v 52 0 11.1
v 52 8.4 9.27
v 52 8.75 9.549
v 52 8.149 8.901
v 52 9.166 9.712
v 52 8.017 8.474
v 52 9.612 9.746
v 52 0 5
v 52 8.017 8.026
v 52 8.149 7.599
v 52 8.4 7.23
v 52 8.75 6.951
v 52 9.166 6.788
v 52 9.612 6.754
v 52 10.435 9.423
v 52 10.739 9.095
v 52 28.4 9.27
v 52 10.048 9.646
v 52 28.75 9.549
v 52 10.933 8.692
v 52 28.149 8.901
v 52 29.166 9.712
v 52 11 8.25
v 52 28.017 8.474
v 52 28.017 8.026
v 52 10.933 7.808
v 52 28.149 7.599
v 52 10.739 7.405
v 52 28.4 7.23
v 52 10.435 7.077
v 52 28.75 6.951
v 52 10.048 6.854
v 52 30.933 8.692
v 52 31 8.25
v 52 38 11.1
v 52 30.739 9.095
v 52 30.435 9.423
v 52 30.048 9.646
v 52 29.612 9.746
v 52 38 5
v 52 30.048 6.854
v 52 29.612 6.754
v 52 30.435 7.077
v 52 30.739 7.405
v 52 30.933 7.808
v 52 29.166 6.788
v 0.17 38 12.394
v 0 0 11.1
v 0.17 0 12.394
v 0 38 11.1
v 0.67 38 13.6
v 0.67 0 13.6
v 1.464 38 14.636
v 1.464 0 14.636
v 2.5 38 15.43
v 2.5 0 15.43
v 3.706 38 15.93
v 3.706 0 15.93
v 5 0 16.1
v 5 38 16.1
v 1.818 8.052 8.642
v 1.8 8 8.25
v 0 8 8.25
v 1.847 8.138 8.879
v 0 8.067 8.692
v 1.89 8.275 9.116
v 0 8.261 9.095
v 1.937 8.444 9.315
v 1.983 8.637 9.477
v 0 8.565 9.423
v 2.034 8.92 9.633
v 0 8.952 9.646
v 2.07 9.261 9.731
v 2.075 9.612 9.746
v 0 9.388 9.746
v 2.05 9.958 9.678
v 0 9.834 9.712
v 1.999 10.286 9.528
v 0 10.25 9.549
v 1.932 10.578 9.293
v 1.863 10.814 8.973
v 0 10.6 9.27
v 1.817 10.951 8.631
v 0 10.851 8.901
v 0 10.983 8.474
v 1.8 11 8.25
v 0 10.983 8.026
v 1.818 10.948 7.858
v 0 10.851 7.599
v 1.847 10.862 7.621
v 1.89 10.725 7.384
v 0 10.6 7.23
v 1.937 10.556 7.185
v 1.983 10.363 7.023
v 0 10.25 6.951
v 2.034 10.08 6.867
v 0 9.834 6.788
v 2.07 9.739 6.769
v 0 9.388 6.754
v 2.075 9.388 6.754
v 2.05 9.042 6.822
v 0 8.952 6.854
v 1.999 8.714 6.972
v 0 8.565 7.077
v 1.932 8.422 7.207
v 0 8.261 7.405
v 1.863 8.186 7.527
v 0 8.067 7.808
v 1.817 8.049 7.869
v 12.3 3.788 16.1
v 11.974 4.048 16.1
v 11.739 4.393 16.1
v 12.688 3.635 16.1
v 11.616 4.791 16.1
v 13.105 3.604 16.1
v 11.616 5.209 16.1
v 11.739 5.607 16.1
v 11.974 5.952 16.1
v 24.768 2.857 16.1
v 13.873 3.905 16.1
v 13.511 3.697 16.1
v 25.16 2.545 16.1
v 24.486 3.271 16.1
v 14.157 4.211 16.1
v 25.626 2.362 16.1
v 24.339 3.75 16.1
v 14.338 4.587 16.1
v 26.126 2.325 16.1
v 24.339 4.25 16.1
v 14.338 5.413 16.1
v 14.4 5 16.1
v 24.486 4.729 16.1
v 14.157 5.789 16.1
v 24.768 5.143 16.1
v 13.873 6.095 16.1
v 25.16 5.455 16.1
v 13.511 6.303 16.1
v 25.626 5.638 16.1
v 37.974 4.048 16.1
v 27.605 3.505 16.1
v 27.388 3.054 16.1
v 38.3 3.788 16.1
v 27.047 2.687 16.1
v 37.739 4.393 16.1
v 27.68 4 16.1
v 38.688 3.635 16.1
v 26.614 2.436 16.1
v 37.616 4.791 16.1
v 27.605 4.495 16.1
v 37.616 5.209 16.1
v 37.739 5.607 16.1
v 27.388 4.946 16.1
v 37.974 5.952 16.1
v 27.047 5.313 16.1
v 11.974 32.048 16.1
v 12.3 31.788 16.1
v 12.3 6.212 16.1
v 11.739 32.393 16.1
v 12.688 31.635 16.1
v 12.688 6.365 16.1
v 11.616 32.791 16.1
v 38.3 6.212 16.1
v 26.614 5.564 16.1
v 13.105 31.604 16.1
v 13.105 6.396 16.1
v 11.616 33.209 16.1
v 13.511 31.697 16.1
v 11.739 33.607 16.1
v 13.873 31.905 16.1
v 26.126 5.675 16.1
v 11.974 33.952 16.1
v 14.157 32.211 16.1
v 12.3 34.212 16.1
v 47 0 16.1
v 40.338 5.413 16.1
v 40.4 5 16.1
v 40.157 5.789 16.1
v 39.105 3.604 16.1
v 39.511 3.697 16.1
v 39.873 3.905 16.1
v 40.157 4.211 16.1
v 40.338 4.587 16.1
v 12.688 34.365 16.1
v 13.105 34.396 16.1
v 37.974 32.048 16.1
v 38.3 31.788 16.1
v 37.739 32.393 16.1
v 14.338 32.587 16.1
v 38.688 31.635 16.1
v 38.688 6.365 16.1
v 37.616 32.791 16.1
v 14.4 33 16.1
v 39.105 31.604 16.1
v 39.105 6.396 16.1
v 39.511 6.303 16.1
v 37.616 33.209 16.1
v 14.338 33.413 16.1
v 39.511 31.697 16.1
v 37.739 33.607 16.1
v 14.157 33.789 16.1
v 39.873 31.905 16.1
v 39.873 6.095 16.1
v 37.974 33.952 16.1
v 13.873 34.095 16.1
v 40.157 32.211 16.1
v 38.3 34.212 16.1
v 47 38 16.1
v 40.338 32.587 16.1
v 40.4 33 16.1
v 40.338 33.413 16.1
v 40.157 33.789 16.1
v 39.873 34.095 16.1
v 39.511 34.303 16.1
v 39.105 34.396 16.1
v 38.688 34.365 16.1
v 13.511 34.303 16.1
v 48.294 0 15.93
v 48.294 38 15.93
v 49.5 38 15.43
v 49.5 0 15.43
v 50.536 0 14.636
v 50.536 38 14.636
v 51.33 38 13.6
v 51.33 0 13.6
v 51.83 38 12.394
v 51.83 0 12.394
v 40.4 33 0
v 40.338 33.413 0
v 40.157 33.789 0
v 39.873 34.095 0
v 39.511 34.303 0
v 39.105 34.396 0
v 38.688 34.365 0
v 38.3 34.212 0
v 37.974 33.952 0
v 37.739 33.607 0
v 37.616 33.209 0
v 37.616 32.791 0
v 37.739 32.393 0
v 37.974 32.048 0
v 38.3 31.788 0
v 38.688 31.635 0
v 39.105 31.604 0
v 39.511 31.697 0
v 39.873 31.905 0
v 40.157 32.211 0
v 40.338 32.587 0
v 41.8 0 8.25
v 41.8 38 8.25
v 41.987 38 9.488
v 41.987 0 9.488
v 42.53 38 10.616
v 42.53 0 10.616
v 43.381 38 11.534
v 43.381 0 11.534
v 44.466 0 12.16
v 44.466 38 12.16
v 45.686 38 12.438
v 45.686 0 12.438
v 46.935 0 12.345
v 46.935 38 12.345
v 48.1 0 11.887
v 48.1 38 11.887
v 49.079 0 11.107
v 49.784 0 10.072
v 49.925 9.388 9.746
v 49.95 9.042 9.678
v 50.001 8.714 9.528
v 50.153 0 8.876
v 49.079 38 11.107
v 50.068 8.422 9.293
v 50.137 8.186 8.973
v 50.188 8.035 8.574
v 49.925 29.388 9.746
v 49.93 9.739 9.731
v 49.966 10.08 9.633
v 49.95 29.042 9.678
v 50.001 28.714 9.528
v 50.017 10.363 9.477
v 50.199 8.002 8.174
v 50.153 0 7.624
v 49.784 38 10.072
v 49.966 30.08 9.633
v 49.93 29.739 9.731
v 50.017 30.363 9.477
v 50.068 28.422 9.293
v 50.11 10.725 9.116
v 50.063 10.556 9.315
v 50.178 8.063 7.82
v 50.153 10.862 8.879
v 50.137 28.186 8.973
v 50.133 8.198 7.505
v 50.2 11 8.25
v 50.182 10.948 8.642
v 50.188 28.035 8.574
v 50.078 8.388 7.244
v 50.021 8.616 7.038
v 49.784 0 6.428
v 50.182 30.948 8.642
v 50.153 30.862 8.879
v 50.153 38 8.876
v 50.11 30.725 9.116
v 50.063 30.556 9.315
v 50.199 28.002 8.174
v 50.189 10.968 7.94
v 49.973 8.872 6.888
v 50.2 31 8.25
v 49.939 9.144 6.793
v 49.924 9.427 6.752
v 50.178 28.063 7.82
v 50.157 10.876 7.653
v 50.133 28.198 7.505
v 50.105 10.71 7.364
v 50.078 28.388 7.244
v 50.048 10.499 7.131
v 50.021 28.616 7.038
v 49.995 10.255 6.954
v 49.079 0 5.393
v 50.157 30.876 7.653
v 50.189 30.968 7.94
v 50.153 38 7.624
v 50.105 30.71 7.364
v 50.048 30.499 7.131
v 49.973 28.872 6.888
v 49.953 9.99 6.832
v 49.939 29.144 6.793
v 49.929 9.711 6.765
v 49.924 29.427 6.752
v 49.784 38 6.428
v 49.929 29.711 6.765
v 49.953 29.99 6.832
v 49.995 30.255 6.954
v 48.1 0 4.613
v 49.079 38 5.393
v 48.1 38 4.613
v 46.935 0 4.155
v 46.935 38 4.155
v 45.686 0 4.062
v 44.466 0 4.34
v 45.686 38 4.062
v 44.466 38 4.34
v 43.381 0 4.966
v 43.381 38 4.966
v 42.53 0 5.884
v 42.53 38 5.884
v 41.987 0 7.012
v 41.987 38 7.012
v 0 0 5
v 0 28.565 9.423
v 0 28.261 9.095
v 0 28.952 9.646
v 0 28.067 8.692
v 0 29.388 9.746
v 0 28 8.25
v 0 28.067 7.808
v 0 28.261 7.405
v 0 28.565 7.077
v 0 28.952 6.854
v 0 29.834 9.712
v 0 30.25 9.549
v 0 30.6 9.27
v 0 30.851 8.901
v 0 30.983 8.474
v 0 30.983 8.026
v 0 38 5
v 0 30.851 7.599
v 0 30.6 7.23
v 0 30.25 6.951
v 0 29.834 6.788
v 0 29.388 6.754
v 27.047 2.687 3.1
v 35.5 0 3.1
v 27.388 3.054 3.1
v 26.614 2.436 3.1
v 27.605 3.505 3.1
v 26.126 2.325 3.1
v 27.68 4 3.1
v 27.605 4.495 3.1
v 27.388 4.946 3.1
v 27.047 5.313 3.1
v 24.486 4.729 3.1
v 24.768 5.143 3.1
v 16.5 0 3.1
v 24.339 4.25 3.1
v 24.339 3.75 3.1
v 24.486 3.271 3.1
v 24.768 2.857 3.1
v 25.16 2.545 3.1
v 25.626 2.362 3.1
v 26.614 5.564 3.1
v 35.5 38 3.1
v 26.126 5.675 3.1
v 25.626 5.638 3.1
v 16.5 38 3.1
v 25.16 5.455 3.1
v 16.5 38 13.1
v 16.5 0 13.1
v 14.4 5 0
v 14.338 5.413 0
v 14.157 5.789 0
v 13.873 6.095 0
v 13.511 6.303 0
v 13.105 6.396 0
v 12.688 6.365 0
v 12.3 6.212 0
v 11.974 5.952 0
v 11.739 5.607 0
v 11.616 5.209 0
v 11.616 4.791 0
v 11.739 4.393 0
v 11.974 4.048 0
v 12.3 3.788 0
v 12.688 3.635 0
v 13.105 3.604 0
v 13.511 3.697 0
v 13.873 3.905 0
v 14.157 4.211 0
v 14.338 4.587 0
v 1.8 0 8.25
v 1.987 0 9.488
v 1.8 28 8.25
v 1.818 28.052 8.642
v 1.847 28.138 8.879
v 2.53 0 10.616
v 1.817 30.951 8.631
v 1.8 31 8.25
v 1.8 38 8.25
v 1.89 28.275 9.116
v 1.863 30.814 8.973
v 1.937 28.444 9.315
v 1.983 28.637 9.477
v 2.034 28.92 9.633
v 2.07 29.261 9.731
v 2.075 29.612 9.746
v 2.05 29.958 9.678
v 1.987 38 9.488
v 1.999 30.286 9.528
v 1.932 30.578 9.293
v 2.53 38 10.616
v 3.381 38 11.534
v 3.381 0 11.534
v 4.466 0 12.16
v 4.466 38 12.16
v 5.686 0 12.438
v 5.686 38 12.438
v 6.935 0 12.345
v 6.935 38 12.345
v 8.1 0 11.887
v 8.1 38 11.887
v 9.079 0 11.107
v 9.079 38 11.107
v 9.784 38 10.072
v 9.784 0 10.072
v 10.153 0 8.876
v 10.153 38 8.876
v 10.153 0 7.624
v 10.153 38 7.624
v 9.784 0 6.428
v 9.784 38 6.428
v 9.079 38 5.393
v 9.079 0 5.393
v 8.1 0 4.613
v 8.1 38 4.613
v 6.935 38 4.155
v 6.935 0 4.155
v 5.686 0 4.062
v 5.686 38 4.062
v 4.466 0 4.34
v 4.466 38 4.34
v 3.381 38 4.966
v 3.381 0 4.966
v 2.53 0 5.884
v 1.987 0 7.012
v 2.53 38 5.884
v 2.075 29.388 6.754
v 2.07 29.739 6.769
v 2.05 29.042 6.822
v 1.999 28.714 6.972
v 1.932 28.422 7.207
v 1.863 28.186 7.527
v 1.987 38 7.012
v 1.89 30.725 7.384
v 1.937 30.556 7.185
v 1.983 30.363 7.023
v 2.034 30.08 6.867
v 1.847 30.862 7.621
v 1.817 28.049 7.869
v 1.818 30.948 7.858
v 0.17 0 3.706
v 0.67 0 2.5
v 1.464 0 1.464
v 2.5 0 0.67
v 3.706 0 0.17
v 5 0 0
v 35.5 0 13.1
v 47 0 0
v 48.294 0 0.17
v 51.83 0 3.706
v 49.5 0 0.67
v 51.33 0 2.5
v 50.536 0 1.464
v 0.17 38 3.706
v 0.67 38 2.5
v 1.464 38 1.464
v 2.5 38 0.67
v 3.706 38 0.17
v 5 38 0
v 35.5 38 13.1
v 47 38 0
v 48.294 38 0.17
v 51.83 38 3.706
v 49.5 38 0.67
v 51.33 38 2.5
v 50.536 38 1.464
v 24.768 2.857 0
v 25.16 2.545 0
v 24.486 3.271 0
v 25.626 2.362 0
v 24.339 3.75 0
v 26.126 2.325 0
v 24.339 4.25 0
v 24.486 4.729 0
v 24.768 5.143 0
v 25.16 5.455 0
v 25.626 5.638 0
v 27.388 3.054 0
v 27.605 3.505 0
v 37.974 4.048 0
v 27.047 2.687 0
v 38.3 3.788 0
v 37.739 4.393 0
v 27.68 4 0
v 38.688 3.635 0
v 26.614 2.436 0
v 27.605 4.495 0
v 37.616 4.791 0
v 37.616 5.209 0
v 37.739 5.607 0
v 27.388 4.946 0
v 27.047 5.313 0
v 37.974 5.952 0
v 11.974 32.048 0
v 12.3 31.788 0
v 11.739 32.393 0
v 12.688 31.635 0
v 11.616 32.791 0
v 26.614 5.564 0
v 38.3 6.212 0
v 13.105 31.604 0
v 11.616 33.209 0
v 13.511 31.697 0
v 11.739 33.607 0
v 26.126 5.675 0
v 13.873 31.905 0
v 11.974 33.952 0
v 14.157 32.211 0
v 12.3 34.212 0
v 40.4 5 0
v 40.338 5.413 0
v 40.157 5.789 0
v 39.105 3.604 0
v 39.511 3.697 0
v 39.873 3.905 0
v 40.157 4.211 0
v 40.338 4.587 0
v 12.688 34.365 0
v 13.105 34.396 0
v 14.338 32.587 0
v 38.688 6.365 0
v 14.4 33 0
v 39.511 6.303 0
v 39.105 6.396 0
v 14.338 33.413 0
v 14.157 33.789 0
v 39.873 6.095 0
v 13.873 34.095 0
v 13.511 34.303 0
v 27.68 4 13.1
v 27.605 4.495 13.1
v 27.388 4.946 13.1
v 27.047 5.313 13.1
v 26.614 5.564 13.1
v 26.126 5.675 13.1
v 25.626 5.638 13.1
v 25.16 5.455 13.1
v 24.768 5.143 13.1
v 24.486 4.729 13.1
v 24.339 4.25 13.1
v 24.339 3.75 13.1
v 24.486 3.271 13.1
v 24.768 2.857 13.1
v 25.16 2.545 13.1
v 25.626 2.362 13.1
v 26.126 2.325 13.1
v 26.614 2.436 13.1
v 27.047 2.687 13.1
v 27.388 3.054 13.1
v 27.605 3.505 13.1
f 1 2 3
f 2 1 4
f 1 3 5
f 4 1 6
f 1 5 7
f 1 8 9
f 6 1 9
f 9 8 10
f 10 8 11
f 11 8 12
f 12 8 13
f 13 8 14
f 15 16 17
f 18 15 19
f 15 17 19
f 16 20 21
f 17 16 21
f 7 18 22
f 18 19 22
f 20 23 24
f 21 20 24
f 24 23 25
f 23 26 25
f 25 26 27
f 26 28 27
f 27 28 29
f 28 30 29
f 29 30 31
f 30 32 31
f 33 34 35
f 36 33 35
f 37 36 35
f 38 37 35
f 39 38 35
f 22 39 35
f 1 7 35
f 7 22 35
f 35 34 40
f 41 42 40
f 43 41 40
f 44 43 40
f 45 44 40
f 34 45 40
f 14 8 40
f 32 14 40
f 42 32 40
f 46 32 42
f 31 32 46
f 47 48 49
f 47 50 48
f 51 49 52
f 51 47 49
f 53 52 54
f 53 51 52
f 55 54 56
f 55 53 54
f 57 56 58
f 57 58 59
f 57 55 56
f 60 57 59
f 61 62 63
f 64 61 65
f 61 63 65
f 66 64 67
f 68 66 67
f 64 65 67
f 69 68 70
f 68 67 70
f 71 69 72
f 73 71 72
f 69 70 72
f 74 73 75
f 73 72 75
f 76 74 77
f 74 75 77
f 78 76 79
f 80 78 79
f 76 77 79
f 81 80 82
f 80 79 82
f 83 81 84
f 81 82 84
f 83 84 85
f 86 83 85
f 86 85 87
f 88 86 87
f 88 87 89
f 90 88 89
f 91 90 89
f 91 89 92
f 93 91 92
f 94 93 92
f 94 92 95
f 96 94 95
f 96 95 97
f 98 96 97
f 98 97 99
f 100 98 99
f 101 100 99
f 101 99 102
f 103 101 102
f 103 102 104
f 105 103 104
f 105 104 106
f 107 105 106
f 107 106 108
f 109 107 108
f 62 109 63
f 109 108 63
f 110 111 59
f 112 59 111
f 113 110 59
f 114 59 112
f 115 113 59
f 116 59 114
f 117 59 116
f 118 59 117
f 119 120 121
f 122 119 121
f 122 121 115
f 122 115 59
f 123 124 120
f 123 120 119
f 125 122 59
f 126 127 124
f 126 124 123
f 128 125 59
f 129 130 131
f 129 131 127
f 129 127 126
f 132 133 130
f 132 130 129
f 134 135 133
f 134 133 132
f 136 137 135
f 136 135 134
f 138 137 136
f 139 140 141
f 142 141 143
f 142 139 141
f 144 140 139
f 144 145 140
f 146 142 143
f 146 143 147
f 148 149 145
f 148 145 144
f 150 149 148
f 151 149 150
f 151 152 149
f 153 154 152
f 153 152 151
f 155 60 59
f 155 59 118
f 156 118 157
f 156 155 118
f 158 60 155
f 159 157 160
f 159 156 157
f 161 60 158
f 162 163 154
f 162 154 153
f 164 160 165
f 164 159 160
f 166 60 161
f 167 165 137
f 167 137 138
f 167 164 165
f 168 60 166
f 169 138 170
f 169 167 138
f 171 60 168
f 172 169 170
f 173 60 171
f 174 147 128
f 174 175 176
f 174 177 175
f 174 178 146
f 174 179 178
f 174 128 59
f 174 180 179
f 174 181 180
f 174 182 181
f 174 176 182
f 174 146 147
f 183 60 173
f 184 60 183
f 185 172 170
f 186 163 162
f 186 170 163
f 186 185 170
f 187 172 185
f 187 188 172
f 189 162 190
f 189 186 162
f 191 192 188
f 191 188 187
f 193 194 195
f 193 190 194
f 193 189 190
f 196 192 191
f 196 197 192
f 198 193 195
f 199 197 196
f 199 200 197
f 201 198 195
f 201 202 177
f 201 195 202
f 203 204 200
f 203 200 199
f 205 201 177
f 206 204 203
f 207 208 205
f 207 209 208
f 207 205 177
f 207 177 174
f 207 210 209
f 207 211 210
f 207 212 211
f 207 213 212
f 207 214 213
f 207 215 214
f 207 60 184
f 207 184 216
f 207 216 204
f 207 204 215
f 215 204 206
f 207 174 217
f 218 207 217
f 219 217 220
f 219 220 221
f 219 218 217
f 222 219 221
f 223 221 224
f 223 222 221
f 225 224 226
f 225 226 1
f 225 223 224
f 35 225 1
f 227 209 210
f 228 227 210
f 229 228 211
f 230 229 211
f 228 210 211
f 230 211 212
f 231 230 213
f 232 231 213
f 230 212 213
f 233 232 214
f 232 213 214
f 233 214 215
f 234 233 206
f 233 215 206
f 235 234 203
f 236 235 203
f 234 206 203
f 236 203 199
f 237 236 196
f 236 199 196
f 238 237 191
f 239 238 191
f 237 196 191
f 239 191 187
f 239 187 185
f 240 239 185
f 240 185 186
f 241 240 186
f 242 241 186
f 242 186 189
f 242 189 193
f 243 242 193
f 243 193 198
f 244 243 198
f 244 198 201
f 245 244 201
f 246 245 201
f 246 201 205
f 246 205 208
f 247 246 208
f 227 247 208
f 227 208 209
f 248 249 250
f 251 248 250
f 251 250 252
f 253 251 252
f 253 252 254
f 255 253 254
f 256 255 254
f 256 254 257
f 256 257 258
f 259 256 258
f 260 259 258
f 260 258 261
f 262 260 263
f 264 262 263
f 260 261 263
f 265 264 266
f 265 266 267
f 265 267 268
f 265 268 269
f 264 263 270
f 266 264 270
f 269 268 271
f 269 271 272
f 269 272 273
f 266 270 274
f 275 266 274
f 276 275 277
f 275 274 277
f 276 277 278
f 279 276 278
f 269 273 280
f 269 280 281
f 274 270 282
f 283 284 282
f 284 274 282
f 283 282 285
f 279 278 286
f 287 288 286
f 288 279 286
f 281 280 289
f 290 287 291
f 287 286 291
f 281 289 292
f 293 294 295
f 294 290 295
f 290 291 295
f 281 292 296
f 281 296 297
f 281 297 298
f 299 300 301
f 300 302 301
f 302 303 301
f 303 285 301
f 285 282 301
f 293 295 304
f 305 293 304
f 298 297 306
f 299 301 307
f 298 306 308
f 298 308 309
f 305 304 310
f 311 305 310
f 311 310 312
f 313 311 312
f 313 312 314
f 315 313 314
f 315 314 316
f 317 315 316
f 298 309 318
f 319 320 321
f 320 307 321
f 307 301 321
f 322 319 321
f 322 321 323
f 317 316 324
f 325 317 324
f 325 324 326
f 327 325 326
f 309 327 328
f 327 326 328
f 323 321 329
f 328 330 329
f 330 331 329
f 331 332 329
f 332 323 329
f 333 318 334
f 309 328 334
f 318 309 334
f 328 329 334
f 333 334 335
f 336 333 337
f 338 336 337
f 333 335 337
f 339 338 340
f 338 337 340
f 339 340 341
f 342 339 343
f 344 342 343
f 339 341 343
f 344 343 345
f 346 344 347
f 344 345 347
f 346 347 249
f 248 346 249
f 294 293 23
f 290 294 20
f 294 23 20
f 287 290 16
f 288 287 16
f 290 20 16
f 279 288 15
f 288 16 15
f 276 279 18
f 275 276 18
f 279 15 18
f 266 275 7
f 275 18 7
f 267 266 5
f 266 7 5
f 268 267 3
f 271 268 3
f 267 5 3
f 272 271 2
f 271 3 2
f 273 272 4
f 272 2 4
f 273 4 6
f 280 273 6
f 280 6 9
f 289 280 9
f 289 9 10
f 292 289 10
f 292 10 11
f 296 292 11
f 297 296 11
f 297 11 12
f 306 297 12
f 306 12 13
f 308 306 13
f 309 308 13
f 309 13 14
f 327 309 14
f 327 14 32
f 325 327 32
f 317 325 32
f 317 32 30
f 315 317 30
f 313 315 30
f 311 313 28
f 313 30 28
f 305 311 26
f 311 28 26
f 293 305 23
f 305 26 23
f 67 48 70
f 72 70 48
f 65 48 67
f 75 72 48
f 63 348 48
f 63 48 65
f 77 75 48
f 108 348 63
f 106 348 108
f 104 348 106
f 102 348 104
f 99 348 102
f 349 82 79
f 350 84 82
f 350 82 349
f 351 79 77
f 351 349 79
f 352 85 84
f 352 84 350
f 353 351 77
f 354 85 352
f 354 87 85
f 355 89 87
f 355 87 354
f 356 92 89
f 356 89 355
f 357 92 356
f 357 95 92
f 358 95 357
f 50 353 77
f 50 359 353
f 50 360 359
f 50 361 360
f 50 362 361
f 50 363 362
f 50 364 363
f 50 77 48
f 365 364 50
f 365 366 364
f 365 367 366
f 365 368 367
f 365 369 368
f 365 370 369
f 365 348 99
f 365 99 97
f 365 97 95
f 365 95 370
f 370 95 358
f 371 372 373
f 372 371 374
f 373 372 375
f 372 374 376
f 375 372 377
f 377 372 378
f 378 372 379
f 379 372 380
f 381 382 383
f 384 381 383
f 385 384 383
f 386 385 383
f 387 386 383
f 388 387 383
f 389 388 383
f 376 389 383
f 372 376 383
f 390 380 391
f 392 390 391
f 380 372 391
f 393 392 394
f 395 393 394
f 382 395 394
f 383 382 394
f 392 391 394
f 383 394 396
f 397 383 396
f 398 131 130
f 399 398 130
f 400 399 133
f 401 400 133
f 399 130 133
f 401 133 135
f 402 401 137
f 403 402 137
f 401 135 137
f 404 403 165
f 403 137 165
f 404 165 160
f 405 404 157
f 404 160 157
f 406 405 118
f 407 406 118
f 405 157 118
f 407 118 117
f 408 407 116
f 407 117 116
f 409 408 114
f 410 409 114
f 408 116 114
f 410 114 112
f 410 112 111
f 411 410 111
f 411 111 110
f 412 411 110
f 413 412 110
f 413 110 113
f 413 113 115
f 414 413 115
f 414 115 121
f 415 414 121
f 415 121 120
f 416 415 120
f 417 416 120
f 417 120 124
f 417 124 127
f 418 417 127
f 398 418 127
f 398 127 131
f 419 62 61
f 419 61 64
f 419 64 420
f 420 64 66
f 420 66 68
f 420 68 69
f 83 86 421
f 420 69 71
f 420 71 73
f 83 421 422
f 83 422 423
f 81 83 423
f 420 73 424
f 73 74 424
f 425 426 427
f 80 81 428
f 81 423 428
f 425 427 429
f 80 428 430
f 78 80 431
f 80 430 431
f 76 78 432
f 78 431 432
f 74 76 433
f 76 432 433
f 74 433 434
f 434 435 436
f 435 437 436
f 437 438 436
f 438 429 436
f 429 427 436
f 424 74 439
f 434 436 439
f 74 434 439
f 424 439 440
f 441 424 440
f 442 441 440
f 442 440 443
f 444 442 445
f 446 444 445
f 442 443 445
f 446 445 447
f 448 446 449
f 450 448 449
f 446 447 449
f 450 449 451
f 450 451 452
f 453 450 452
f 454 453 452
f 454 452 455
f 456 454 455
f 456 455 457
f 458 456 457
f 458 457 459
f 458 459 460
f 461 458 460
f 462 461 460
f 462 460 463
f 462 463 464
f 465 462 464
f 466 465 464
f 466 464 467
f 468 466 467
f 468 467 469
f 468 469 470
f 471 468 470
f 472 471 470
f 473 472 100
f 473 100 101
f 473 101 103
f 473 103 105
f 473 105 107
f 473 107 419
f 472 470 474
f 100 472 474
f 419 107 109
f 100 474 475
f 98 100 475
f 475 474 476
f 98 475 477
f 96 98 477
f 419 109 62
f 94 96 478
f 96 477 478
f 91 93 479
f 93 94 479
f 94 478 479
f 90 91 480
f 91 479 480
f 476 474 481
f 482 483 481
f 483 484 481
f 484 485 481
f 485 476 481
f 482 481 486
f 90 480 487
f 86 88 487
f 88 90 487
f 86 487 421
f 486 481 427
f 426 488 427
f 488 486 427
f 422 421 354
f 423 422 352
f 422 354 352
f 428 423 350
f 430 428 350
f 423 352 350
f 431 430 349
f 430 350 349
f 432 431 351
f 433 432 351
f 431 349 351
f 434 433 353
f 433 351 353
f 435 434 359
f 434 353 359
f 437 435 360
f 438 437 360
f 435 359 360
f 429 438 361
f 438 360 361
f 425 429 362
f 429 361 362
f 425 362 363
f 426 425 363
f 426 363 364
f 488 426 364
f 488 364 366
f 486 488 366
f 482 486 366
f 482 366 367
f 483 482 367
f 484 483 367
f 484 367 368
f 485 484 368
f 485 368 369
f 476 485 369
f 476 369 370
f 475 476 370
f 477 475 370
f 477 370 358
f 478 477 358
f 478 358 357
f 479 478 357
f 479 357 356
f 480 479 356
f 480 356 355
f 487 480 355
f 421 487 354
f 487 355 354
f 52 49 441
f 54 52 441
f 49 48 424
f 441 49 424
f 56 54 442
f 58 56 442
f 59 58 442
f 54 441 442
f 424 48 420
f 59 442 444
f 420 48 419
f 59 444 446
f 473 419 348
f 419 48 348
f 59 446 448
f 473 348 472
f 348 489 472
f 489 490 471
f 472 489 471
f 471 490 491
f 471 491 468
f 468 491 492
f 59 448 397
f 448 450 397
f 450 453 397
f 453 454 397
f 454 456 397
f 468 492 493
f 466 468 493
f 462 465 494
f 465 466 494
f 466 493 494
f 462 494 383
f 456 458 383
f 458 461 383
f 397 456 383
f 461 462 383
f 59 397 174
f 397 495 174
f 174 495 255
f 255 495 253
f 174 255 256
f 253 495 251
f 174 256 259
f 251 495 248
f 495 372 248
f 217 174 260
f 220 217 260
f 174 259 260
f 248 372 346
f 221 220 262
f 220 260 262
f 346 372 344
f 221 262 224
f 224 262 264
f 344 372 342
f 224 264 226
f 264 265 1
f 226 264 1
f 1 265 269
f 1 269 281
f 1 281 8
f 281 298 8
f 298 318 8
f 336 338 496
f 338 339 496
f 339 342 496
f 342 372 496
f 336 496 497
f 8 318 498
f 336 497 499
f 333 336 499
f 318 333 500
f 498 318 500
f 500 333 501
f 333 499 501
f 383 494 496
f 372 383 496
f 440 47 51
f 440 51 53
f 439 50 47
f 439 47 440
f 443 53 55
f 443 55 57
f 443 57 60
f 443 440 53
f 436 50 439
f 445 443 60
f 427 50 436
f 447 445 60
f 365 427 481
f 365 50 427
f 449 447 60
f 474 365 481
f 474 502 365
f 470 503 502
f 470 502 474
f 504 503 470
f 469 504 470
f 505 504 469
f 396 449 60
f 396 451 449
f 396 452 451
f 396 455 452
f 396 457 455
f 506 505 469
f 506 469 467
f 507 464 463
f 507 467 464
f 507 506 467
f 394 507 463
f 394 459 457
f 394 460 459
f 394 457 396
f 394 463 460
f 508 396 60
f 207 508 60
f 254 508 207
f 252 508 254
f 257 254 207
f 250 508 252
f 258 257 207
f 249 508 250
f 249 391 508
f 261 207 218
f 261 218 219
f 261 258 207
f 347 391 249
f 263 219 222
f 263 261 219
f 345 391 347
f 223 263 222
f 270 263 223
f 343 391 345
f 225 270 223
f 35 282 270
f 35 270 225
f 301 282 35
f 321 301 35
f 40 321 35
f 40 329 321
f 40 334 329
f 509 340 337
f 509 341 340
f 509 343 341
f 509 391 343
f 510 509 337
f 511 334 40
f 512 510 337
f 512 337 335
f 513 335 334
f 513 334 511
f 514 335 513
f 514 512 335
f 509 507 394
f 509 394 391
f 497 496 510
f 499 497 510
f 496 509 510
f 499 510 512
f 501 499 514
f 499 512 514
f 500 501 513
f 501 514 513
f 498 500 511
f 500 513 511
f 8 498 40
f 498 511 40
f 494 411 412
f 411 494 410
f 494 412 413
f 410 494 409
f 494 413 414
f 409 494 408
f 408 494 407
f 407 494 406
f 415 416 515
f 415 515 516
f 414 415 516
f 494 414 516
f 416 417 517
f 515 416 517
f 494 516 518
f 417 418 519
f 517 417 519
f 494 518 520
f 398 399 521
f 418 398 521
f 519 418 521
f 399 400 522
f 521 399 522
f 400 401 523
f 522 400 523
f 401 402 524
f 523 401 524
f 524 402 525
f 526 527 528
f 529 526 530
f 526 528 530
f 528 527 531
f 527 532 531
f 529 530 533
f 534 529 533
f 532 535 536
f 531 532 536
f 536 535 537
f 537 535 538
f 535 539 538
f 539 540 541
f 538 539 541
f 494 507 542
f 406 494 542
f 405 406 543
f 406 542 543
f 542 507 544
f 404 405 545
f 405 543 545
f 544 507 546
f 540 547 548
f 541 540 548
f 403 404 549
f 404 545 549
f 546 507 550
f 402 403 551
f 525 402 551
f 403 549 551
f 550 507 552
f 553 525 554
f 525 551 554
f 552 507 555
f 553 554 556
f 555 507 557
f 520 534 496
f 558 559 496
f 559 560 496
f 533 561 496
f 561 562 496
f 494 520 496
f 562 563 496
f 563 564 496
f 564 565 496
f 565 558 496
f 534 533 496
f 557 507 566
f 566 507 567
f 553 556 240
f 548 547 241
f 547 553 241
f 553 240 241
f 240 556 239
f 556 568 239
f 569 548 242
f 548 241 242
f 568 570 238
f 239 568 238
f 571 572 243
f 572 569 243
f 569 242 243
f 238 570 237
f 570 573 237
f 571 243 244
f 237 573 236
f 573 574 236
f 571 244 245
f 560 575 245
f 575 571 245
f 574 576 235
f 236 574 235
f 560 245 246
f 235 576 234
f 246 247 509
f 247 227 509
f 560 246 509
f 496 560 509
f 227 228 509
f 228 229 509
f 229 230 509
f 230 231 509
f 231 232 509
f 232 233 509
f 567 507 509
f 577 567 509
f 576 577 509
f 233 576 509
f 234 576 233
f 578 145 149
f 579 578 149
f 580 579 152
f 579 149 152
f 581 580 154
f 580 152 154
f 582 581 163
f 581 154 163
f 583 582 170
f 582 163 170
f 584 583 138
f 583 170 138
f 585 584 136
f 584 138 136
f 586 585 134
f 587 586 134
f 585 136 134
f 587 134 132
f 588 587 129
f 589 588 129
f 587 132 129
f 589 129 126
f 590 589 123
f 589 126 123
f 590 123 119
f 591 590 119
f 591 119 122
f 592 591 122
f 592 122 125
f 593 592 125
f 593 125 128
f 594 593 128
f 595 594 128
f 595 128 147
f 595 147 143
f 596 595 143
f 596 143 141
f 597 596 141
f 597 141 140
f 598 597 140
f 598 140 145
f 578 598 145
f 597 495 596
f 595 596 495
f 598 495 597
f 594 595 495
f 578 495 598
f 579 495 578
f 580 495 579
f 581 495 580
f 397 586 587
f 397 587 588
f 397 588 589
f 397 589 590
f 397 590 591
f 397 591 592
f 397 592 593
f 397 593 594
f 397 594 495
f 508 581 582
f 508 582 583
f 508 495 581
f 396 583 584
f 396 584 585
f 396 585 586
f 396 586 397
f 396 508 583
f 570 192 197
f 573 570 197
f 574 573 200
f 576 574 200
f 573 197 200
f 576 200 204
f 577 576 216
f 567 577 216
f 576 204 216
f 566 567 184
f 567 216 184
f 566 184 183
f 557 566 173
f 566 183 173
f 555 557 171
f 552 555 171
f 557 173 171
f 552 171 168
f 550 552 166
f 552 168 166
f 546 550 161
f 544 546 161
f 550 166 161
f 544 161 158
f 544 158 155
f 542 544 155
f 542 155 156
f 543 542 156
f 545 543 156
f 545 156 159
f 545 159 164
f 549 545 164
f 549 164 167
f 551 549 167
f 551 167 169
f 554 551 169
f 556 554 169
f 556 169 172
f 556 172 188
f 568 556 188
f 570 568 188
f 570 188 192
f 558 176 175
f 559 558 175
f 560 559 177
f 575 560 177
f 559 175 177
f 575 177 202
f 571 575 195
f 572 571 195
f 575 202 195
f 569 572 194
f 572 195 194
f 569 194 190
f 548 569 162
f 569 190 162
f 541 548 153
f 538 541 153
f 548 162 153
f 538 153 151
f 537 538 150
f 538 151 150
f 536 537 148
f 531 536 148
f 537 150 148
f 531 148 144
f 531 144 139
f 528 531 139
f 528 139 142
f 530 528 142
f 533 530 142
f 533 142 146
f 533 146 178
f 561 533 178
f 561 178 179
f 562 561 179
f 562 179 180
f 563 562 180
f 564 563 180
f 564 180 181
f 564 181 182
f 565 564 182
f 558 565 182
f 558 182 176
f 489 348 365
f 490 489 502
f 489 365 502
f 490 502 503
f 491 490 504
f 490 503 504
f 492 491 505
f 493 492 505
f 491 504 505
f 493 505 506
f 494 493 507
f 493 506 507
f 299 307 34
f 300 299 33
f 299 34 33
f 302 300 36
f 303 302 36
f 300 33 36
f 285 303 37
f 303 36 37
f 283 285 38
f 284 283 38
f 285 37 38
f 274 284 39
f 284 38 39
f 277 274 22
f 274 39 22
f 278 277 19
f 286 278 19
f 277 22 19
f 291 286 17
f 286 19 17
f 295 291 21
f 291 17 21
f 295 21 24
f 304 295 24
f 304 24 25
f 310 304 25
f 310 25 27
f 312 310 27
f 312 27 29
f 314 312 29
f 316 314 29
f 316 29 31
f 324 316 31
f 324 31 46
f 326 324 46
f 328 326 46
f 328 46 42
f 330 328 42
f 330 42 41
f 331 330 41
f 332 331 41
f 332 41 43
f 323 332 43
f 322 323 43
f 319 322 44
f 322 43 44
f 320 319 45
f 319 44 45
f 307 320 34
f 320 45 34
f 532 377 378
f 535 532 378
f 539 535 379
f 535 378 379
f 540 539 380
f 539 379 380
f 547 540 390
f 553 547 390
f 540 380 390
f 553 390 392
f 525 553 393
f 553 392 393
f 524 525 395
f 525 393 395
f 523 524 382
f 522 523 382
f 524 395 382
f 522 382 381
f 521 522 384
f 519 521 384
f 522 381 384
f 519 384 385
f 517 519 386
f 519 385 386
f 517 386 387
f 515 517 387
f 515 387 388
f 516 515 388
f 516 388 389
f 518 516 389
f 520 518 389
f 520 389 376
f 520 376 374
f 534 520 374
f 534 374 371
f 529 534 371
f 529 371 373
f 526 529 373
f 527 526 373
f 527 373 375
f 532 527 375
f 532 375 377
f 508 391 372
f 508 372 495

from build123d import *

# Parameters (mm, degrees)
BOX_W           = 52
BOX_H           = 38
BOX_DEPTH       = 16.1
SKETCH003_R     = 4.2
SKETCH003_W     = 19
SKETCH003_H     = 10
POCKET_DEPTH    = 38.001
SKETCH007_R     = 1.4
POCKET001_DEPTH = 16.101
SKETCH008_R     = 1.5
POCKET002_DEPTH = 3
SKETCH004_R     = 1.5
POCKET003_DEPTH = 3
SKETCH013_R     = 1.68
POCKET004_DEPTH = 16.101
FILLET004_R     = 5


with BuildPart() as part:
    # Box → Box (new body)
    with BuildSketch(Plane.XY):
        with Locations((26, 19)):
            Rectangle(BOX_W, BOX_H)
    extrude(amount=BOX_DEPTH)

    # Sketch003 → Pocket (cut, through all)
    with BuildSketch(Plane(origin=(0, 38, 0), x_dir=(-1, 0, 0), z_dir=(0, 1, 0))):
        with Locations((-46, 8.25)):
            Circle(SKETCH003_R)
        with Locations((-6, 8.25)):
            Circle(SKETCH003_R)
        with Locations((-26, 8.1)):
            Rectangle(SKETCH003_W, SKETCH003_H)
    extrude(amount=-POCKET_DEPTH, mode=Mode.SUBTRACT)

    # Sketch007 → Pocket001 (cut, through all)
    with BuildSketch(Plane.XY.offset(16.1)):
        with Locations((13, 5)):
            Circle(SKETCH007_R)
        with Locations((39, 5)):
            Circle(SKETCH007_R)
        with Locations((39, 33)):
            Circle(SKETCH007_R)
        with Locations((13, 33)):
            Circle(SKETCH007_R)
    extrude(amount=-POCKET001_DEPTH, mode=Mode.SUBTRACT)

    # Sketch008 → Pocket002 (cut)
    with BuildSketch(Plane(origin=(0, 0, 0), x_dir=(0, -1, 0), z_dir=(-1, 0, 0))):
        with Locations((-29.5, 8.25)):
            Circle(SKETCH008_R)
        with Locations((-9.5, 8.25)):
            Circle(SKETCH008_R)
    extrude(amount=-POCKET002_DEPTH, mode=Mode.SUBTRACT)

    # Sketch004 → Pocket003 (cut)
    with BuildSketch(Plane.YZ.offset(52)):
        with Locations((9.5, 8.25)):
            Circle(SKETCH004_R)
        with Locations((29.5, 8.25)):
            Circle(SKETCH004_R)
    extrude(amount=-POCKET003_DEPTH, mode=Mode.SUBTRACT)

    # Sketch013 → Pocket004 (cut, through all)
    with BuildSketch(Plane.XY.offset(16.1)):
        with Locations((26, 4)):
            Circle(SKETCH013_R)
    extrude(amount=-POCKET004_DEPTH, mode=Mode.SUBTRACT)

    # Fillet004
    fillet004_edges = [part.edges().sort_by_distance(p)[0] for p in [
        (52, 19, 16.1),
        (52, 19, 0),
        (0, 19, 16.1),
        (0, 19, 0),
    ]]
    fillet(fillet004_edges, radius=FILLET004_R)


solid = part.part
